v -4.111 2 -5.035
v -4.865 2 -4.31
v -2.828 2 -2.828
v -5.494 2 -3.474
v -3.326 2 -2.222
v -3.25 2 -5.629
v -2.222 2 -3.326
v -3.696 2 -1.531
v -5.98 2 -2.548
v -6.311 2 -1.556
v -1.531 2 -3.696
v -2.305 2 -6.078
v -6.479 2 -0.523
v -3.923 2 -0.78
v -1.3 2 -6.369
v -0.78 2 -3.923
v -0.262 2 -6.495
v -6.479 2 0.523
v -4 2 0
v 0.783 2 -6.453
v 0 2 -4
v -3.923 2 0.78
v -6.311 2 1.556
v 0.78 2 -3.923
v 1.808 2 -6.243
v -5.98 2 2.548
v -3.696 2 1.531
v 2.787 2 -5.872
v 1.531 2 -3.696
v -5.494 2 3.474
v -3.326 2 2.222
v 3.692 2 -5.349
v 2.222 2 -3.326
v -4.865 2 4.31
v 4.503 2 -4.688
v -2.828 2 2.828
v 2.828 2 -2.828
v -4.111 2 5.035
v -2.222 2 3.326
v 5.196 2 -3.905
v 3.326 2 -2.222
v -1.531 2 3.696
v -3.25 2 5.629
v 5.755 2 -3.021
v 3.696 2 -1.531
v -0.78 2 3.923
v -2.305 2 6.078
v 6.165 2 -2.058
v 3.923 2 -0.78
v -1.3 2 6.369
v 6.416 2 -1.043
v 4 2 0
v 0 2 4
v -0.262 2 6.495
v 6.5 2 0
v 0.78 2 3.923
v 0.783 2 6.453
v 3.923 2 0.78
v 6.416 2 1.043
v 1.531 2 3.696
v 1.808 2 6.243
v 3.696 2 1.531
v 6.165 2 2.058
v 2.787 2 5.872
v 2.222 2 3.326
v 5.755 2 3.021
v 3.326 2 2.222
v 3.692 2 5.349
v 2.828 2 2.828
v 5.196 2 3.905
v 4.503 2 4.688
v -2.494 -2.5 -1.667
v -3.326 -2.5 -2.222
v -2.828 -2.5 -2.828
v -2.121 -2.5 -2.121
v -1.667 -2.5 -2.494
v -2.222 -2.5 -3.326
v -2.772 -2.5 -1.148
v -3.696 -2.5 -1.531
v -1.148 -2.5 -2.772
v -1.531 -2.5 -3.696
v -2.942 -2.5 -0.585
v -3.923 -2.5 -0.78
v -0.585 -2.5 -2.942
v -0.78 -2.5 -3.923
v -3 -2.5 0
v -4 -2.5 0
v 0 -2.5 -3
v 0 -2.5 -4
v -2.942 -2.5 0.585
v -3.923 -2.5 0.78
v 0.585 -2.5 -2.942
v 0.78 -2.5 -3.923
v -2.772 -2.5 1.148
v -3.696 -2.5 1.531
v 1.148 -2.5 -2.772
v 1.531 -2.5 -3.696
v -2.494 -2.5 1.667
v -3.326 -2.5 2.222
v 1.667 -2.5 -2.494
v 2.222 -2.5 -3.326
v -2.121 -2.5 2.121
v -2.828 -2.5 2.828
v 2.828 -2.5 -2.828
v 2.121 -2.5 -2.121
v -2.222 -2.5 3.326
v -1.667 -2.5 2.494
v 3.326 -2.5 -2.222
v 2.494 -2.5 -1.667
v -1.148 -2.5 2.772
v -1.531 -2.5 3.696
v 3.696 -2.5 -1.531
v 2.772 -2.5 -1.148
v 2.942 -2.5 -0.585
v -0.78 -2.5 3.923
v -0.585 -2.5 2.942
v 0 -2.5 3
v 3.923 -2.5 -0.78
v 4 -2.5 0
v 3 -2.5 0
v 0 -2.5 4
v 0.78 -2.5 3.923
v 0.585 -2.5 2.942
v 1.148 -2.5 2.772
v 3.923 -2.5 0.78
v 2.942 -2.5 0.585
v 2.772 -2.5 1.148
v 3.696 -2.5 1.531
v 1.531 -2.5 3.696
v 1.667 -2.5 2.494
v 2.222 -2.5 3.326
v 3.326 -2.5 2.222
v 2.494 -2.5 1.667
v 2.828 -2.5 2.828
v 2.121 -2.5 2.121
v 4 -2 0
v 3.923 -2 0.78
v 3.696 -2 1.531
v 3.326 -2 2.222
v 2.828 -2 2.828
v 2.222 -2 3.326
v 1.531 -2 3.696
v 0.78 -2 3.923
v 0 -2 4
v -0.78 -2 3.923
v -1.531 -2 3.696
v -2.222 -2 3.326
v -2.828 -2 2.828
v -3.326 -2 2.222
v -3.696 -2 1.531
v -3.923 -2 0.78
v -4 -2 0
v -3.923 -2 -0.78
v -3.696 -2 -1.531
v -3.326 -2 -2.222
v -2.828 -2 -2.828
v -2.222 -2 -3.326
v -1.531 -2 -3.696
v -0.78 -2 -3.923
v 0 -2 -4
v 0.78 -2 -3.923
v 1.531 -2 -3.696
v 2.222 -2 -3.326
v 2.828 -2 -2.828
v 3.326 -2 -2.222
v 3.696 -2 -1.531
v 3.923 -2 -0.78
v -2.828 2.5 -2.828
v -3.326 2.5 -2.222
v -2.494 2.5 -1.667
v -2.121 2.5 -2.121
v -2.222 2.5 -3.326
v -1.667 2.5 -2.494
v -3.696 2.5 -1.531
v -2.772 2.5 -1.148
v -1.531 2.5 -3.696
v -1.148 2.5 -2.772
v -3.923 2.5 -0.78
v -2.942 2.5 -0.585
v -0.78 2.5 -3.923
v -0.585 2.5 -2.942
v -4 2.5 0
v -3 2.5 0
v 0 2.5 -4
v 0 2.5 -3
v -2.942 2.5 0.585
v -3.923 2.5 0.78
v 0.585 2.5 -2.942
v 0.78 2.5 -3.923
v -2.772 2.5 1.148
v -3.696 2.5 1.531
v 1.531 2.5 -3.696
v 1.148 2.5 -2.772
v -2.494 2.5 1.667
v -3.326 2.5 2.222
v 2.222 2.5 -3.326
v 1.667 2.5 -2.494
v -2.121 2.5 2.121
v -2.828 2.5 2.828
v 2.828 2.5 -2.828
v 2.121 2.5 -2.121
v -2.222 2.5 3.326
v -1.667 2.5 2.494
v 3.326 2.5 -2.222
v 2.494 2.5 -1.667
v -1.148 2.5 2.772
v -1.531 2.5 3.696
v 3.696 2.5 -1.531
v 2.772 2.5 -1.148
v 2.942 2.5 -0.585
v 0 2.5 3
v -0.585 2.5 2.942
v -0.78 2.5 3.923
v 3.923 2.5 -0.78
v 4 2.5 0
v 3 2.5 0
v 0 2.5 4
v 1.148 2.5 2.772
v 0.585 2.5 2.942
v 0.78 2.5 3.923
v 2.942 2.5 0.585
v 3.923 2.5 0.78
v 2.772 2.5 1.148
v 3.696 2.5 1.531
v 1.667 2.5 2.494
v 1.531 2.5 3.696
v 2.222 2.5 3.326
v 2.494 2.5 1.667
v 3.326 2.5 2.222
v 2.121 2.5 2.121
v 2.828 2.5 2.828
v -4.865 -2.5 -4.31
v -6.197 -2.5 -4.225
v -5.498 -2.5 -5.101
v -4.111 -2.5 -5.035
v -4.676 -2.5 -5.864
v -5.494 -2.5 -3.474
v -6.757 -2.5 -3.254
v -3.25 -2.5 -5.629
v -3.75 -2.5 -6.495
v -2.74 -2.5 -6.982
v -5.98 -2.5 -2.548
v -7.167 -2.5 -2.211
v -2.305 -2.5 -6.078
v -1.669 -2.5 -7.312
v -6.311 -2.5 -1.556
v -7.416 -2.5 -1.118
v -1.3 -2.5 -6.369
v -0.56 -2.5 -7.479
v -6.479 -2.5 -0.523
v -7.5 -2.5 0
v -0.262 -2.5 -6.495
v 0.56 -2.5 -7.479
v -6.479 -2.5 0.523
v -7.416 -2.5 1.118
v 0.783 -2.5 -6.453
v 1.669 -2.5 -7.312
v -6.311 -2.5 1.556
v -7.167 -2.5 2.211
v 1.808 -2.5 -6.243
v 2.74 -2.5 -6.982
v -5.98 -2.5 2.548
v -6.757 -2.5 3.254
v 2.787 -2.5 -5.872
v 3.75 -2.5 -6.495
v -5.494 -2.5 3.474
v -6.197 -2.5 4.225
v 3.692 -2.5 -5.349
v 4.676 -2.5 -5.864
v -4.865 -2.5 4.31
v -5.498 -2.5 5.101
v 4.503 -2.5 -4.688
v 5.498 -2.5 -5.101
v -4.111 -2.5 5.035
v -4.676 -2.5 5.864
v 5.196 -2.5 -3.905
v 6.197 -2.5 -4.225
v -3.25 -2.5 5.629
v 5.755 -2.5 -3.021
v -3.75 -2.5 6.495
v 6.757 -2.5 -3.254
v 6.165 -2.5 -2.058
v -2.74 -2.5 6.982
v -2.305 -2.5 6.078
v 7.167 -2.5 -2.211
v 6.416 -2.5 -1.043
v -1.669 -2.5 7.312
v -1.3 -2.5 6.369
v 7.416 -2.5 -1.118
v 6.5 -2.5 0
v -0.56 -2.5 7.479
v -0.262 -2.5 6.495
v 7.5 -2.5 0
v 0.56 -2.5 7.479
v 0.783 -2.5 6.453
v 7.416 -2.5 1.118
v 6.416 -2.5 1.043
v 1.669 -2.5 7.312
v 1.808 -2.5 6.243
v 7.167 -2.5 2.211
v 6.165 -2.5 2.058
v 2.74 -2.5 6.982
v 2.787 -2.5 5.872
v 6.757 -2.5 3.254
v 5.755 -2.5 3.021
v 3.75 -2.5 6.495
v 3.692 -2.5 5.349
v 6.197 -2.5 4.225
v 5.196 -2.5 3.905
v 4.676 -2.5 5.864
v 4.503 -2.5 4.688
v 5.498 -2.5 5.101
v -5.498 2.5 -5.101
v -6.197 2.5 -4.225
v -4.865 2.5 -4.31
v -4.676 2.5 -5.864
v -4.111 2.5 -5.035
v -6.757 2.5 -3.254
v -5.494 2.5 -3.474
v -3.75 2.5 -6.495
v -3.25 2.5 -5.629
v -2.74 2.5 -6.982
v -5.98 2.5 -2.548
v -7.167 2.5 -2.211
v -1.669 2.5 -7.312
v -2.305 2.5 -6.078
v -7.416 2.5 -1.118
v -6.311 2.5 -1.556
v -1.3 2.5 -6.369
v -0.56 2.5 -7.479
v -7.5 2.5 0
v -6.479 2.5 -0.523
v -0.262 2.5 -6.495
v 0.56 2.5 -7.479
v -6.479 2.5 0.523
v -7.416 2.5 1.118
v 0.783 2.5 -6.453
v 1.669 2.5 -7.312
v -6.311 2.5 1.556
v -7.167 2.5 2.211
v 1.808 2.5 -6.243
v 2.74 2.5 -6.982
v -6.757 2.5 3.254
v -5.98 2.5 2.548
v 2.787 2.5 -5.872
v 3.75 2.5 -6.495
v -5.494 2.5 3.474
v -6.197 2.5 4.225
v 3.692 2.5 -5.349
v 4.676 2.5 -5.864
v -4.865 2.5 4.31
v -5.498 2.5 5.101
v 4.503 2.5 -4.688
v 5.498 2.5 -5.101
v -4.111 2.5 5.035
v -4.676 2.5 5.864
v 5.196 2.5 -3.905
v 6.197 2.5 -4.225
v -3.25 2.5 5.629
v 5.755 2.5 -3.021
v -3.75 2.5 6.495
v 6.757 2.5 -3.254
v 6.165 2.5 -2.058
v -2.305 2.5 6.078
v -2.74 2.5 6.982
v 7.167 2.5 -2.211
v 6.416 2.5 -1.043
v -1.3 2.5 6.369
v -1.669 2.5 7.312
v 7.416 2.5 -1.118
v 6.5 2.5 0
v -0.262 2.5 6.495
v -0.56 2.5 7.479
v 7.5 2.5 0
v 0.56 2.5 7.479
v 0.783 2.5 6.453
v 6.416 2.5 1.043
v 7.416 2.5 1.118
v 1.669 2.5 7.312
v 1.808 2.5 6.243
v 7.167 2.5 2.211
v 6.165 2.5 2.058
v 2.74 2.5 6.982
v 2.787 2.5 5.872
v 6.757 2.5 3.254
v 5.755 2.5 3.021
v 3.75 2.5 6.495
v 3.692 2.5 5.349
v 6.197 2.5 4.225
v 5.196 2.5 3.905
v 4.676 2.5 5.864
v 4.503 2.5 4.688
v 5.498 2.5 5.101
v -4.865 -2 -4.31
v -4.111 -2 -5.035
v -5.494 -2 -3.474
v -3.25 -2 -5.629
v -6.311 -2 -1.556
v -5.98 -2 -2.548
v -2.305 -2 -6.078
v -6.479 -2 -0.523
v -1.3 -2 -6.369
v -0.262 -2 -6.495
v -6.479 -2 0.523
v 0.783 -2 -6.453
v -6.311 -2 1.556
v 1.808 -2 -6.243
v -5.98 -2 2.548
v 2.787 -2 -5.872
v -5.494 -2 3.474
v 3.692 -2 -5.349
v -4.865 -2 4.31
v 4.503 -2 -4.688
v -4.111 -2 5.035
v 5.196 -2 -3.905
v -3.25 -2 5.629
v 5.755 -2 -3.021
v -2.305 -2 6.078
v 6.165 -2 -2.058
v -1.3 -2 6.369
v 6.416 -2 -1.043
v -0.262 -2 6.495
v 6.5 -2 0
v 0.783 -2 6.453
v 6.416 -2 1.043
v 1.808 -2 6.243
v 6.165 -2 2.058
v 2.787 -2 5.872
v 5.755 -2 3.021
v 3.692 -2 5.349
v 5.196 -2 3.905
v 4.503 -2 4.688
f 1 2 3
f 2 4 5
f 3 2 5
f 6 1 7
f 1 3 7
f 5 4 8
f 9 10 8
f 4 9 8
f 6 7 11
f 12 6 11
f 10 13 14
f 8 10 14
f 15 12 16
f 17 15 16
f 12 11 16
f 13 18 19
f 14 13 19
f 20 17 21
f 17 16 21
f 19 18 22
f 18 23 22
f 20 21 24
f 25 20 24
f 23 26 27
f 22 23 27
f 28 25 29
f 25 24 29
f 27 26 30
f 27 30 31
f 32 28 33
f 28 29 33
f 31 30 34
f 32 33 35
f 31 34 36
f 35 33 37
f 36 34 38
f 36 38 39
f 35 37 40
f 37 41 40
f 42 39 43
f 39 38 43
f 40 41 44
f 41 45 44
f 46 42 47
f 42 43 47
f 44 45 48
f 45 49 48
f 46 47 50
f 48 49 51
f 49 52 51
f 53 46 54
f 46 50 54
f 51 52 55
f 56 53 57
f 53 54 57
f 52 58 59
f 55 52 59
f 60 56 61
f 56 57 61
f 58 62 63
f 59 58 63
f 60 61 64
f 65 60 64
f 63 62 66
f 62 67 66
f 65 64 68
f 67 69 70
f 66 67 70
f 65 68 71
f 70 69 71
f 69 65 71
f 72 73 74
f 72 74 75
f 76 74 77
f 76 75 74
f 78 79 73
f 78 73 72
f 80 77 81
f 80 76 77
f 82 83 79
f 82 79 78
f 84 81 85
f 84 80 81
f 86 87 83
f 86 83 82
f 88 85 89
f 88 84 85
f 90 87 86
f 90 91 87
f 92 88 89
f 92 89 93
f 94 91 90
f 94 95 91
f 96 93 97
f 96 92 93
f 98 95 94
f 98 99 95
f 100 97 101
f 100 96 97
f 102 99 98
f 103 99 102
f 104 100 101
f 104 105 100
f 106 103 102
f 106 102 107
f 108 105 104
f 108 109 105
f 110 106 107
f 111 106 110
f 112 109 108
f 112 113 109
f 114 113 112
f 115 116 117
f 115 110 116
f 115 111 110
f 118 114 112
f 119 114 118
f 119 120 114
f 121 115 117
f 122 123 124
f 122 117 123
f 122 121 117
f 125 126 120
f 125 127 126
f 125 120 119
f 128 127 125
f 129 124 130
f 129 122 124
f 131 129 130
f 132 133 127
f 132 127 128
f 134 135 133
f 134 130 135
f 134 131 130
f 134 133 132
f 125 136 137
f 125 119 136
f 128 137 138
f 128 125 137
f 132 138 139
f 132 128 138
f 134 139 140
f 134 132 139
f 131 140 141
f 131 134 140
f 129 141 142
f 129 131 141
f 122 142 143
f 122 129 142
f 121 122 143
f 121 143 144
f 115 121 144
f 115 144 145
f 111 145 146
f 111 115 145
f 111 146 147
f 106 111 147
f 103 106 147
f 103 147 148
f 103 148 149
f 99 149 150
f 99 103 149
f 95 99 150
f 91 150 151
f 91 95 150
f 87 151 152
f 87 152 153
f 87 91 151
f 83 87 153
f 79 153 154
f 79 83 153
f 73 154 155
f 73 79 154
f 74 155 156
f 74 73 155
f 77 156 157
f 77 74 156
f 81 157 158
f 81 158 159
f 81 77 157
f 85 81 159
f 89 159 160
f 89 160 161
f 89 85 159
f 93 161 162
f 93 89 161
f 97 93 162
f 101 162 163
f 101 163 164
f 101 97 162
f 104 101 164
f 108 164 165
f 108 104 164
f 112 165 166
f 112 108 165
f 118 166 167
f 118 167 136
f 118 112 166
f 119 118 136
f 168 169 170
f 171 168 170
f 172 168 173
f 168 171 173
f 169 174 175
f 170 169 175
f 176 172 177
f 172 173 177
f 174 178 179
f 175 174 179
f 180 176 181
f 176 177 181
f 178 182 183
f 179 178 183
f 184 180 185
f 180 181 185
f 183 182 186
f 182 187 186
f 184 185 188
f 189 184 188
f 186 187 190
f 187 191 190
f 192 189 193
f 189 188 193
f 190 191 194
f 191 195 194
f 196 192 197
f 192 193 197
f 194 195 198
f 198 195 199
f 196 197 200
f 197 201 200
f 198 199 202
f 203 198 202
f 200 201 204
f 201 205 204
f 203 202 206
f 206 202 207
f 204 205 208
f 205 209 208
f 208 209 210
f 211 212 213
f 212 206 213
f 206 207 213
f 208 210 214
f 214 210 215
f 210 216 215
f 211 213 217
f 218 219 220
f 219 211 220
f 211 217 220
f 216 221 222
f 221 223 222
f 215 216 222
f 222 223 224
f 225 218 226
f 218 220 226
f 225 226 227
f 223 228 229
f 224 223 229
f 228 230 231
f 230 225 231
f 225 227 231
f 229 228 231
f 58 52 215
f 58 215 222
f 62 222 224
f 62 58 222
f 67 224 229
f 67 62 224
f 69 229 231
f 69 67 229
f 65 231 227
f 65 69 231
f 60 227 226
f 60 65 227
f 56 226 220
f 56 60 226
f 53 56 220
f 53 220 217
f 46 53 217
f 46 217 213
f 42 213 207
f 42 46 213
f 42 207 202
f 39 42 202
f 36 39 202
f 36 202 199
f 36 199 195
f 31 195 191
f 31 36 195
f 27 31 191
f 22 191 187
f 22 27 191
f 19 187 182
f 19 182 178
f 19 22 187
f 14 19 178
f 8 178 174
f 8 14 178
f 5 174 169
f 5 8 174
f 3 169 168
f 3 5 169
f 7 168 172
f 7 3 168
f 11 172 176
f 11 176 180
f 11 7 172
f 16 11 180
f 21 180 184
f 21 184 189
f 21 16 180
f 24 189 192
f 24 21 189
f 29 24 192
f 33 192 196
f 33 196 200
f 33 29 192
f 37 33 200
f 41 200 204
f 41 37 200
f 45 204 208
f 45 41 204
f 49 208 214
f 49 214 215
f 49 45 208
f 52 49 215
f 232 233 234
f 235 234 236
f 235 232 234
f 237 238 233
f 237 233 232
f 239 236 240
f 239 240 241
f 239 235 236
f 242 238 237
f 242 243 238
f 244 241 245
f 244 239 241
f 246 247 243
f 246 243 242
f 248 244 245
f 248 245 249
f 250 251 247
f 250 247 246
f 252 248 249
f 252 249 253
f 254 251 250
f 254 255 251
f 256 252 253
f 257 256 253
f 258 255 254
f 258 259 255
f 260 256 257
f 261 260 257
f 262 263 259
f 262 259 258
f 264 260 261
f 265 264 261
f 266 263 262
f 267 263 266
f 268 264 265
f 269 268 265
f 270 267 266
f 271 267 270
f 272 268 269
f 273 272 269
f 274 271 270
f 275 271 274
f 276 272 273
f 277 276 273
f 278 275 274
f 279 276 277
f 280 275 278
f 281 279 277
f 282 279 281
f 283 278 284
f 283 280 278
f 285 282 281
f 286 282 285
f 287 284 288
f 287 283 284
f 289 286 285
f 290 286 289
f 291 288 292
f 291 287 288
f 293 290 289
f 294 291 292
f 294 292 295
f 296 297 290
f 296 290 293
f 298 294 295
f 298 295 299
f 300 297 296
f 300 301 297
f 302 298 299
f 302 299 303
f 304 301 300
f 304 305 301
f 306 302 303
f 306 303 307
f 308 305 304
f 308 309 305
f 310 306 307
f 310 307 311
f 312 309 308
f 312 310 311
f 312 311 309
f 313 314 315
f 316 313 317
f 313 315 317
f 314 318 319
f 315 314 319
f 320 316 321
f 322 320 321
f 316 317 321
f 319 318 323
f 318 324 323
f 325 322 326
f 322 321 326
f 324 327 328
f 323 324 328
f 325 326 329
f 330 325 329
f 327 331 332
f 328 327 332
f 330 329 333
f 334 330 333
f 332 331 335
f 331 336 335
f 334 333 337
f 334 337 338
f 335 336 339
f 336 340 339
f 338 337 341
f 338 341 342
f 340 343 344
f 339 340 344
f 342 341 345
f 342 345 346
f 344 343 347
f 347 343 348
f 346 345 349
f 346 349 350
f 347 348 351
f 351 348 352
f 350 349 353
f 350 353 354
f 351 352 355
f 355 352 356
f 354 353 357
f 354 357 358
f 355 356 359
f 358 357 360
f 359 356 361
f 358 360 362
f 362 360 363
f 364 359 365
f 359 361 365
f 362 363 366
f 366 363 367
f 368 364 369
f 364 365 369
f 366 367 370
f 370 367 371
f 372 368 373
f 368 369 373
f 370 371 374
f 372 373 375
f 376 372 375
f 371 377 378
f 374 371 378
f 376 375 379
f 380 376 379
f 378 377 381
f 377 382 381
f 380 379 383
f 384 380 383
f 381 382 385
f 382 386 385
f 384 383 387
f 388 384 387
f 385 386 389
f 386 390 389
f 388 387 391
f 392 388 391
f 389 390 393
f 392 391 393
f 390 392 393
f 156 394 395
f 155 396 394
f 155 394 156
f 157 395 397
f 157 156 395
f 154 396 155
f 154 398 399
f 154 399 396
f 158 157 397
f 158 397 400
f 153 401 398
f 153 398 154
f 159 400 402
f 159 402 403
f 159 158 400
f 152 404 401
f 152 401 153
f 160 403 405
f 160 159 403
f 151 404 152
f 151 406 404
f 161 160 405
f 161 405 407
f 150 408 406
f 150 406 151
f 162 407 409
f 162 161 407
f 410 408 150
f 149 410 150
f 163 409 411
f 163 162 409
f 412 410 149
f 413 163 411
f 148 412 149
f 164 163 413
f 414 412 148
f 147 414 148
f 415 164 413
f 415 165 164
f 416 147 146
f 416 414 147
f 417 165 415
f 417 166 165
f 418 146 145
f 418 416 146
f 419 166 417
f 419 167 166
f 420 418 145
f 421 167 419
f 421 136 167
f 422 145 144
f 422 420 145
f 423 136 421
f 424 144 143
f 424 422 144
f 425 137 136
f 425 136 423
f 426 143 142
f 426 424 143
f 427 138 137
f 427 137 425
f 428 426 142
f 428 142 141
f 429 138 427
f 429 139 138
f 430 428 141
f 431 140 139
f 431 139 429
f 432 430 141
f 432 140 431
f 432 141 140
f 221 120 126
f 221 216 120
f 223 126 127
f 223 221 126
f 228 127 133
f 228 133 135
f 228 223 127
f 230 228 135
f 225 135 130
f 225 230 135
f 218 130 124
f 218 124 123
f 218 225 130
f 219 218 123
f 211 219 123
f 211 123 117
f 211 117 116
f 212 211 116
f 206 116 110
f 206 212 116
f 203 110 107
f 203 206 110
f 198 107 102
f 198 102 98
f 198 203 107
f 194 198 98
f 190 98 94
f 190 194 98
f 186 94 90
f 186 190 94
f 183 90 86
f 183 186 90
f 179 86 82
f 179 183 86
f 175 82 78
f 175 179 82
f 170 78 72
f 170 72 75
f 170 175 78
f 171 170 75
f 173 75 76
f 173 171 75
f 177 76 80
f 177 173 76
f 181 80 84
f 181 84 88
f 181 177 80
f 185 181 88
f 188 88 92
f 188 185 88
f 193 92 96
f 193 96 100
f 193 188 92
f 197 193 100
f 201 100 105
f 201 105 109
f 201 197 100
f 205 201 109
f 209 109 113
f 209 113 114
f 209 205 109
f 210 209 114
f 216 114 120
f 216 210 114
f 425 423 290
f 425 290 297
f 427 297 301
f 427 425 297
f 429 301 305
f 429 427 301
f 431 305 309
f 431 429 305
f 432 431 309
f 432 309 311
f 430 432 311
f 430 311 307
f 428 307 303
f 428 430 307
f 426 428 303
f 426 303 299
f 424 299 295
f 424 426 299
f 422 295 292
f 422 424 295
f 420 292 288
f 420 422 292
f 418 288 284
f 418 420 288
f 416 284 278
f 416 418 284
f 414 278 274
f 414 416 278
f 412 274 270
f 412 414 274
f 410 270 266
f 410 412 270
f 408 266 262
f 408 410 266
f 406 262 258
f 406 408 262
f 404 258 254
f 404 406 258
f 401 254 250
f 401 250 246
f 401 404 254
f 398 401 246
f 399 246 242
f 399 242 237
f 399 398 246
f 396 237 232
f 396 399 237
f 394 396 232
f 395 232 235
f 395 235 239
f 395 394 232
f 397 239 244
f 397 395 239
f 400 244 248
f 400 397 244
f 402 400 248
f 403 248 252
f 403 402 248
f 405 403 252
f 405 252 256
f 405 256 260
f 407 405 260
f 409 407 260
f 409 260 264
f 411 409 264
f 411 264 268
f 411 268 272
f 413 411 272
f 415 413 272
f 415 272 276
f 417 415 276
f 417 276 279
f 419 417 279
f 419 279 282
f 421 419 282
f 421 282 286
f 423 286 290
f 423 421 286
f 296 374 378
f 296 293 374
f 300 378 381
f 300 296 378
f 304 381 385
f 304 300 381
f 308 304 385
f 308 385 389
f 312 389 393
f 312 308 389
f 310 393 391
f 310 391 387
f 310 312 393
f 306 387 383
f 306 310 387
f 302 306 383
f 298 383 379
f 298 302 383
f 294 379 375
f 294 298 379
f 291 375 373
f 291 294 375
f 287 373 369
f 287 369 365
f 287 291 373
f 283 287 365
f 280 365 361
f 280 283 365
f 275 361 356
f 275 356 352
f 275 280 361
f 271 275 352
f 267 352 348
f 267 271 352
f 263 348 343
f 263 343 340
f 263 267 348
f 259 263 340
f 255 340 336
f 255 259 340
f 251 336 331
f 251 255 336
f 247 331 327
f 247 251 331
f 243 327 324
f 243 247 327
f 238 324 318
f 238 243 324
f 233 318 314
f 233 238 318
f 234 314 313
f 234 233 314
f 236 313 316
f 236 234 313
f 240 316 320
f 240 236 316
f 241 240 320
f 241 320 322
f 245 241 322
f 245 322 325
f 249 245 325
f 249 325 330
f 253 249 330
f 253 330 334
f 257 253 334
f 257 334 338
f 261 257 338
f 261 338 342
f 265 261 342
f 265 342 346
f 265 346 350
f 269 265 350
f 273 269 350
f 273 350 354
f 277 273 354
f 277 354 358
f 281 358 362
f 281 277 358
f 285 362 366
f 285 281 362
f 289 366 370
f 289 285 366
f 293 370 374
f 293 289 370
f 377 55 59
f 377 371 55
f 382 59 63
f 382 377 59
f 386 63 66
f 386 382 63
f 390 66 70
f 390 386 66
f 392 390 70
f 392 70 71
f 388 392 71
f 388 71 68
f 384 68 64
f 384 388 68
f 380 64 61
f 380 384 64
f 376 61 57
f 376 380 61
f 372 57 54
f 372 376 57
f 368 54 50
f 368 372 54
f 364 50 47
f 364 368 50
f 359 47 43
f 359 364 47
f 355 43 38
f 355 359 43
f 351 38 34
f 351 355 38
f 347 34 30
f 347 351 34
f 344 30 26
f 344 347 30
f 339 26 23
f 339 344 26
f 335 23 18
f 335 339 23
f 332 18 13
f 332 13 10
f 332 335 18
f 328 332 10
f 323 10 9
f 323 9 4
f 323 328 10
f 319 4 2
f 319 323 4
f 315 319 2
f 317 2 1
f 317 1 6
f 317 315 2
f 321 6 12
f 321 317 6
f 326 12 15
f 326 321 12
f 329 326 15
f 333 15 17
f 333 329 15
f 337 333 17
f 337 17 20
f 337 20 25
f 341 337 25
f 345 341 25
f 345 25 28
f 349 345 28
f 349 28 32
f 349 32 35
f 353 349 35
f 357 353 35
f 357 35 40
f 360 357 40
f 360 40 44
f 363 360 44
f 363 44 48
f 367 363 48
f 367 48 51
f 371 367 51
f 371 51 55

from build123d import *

# Parameters (mm, degrees)
F0_R     = 7.5
F0_R_2   = 6.5
F1_DEPTH = 2.5
F0_R_3   = 4
F2_DEPTH = 2
F0_R_4   = 3
F3_DEPTH = 2.5


with BuildPart() as f1:
    # F0 (on Front) → F1 (new body, symmetric)
    with BuildSketch(Plane.XZ):
        Circle(F0_R)
        Circle(F0_R_2, mode=Mode.SUBTRACT)
    extrude(amount=F1_DEPTH, both=True)

    # F0 (on Front) → F2 (join, symmetric)
    with BuildSketch(Plane.XZ):
        Circle(F0_R_2)
        Circle(F0_R_3, mode=Mode.SUBTRACT)
    extrude(amount=F2_DEPTH, both=True)

    # F0 (on Front) → F3 (join, symmetric)
    with BuildSketch(Plane.XZ):
        Circle(F0_R_3)
        Circle(F0_R_4, mode=Mode.SUBTRACT)
    extrude(amount=F3_DEPTH, both=True)


solid = f1.part
